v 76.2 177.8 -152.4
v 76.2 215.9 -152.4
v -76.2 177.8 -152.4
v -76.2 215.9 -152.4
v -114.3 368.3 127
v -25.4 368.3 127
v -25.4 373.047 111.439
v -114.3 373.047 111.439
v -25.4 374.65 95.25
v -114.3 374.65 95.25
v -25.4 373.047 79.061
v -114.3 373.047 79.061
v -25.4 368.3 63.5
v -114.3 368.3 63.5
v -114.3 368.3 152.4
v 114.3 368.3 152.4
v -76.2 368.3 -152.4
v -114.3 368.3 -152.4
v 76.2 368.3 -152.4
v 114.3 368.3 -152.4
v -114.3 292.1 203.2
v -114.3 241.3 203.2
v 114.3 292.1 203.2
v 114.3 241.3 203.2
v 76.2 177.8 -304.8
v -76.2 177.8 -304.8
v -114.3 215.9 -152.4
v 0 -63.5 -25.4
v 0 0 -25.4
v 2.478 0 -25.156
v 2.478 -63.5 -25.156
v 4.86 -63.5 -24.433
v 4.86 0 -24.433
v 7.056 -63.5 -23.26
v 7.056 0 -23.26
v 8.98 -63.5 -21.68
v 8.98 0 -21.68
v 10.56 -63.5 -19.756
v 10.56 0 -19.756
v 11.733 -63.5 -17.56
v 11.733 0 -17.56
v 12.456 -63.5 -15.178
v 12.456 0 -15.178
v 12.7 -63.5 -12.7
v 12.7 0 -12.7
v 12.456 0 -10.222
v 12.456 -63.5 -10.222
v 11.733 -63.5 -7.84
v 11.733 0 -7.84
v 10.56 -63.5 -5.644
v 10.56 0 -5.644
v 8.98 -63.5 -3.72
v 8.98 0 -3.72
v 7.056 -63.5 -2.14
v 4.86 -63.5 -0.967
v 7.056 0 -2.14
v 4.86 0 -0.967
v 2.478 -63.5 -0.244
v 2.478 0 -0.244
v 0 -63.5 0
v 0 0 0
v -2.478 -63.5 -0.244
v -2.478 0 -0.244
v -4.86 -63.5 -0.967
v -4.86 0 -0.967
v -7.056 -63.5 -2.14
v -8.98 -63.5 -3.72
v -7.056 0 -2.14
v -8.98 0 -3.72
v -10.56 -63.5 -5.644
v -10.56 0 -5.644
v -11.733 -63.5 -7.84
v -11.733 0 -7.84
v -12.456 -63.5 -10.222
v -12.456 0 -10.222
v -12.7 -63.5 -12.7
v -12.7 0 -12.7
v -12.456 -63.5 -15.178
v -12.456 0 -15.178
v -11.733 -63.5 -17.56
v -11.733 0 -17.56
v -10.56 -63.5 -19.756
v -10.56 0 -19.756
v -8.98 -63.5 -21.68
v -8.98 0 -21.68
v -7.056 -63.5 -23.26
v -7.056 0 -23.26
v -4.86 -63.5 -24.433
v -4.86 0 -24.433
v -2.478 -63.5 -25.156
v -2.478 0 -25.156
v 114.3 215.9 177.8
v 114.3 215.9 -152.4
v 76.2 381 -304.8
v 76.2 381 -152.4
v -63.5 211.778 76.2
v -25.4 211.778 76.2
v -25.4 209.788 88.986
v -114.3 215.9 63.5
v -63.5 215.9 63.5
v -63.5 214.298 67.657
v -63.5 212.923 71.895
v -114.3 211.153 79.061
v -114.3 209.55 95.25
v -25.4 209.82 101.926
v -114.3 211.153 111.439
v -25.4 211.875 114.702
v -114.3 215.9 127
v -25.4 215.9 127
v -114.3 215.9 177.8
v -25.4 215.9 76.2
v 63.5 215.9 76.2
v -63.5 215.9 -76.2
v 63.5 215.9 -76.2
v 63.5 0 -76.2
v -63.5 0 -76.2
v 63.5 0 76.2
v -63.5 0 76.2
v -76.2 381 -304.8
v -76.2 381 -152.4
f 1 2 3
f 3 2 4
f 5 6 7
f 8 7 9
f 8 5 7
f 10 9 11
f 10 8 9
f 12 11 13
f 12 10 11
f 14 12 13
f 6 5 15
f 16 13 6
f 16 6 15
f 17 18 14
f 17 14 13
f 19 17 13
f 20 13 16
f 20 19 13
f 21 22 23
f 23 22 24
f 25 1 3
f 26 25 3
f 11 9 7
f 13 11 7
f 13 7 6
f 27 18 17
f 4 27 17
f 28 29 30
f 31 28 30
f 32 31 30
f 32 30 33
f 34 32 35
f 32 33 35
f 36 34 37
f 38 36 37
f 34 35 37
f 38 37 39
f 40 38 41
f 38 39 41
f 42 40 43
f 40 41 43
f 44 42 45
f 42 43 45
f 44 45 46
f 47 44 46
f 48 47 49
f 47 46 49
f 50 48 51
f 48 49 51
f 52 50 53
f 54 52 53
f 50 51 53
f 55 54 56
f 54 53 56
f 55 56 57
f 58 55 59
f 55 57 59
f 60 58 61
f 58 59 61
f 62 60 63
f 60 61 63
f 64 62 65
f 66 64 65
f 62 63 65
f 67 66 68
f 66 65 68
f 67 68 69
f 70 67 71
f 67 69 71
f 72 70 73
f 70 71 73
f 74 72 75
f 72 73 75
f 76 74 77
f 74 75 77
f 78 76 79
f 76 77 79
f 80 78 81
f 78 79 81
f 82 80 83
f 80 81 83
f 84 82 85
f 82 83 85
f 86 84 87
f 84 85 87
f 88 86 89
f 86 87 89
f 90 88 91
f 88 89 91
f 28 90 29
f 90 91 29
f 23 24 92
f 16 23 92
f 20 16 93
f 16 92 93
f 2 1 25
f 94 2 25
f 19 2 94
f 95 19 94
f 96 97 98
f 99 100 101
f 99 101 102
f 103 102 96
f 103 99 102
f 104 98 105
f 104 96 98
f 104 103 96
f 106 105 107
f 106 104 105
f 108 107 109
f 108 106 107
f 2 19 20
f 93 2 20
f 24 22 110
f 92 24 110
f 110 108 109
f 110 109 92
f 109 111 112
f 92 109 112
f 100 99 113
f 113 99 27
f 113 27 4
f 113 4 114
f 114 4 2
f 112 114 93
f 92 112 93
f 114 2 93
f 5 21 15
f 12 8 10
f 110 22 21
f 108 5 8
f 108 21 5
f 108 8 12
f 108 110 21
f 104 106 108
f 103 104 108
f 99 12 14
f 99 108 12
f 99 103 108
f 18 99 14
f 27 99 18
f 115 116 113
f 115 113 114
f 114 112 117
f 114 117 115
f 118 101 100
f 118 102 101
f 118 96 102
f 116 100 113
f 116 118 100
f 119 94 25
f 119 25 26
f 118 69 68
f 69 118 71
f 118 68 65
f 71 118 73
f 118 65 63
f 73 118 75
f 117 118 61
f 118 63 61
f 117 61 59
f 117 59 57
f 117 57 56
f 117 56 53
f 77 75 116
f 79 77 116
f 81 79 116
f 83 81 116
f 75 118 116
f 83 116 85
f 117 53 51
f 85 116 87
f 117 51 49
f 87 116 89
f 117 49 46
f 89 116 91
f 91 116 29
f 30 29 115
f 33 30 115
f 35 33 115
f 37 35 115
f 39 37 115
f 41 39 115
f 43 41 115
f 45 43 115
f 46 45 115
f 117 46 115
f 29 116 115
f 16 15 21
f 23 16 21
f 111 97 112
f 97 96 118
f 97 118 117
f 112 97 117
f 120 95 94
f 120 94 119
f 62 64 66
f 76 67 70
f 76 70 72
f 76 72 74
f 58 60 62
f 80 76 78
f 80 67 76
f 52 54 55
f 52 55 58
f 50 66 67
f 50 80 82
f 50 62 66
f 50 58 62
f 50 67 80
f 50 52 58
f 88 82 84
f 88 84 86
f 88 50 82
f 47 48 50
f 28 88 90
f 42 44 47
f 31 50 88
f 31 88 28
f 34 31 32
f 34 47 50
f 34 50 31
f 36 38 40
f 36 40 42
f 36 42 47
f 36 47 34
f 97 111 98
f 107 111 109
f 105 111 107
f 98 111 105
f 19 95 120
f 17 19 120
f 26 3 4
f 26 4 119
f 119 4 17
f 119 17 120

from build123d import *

# Parameters (mm, degrees)
SKETCH2_W           = 127
SKETCH2_H           = 152.4
BOSS_EXTRUDE2_DEPTH = 215.9
SKETCH3_W           = 228.6
SKETCH3_H           = 355.6
BOSS_EXTRUDE3_DEPTH = 152.4
SKETCH4_R           = 82.55
BOSS_EXTRUDE4_DEPTH = 88.9
CUT_EXTRUDE1_DEPTH  = 484.643280218
SKETCH6_W           = 152.4
SKETCH6_H           = 203.2
BOSS_EXTRUDE5_DEPTH = 152.4
SKETCH7_R           = 12.7
BOSS_EXTRUDE6_DEPTH = 63.5


with BuildPart() as part:
    # Sketch2 → Boss-Extrude2 (new body)
    with BuildSketch(Plane(origin=(0, 0, 0), x_dir=(1, 0, 0), z_dir=(0, 1, 0))):
        Rectangle(SKETCH2_W, SKETCH2_H)
    extrude(amount=BOSS_EXTRUDE2_DEPTH)

    # Sketch3 → Boss-Extrude3 (add)
    with BuildSketch(Plane(origin=(0, 215.9, 0), x_dir=(1, 0, 0), z_dir=(0, 1, 0))):
        with Locations((0, -25.4)):
            Rectangle(SKETCH3_W, SKETCH3_H)
    extrude(amount=BOSS_EXTRUDE3_DEPTH)

    # Sketch4 → Boss-Extrude4 (add)
    with BuildSketch(Plane.ZY.offset(114.3)):
        with Locations((95.25, 292.1)):
            Circle(SKETCH4_R)
    extrude(amount=-BOSS_EXTRUDE4_DEPTH)

    # Sketch5 → Cut-Extrude1 (cut, through all)
    with BuildSketch(Plane.ZY.offset(114.3)):
        Polygon((152.4, 368.3), (203.2, 292.1), (203.2, 368.3), align=None)
        Polygon((203.2, 215.9), (203.2, 241.3), (177.8, 215.9), align=None)
    extrude(amount=-CUT_EXTRUDE1_DEPTH, mode=Mode.SUBTRACT)

    # Sketch6 → Boss-Extrude5 (add)
    with BuildSketch(Plane(origin=(0, 0, -152.4), x_dir=(-1, 0, 0), z_dir=(0, 0, -1))):
        with Locations((0, 279.4)):
            Rectangle(SKETCH6_W, SKETCH6_H)
    extrude(amount=BOSS_EXTRUDE5_DEPTH)

    # Sketch7 → Boss-Extrude6 (add)
    with BuildSketch(Plane.XZ):
        with Locations(Location((0, -12.7, 0), (0, 0, 270))):
            Circle(SKETCH7_R)
    extrude(amount=BOSS_EXTRUDE6_DEPTH)


solid = part.part
